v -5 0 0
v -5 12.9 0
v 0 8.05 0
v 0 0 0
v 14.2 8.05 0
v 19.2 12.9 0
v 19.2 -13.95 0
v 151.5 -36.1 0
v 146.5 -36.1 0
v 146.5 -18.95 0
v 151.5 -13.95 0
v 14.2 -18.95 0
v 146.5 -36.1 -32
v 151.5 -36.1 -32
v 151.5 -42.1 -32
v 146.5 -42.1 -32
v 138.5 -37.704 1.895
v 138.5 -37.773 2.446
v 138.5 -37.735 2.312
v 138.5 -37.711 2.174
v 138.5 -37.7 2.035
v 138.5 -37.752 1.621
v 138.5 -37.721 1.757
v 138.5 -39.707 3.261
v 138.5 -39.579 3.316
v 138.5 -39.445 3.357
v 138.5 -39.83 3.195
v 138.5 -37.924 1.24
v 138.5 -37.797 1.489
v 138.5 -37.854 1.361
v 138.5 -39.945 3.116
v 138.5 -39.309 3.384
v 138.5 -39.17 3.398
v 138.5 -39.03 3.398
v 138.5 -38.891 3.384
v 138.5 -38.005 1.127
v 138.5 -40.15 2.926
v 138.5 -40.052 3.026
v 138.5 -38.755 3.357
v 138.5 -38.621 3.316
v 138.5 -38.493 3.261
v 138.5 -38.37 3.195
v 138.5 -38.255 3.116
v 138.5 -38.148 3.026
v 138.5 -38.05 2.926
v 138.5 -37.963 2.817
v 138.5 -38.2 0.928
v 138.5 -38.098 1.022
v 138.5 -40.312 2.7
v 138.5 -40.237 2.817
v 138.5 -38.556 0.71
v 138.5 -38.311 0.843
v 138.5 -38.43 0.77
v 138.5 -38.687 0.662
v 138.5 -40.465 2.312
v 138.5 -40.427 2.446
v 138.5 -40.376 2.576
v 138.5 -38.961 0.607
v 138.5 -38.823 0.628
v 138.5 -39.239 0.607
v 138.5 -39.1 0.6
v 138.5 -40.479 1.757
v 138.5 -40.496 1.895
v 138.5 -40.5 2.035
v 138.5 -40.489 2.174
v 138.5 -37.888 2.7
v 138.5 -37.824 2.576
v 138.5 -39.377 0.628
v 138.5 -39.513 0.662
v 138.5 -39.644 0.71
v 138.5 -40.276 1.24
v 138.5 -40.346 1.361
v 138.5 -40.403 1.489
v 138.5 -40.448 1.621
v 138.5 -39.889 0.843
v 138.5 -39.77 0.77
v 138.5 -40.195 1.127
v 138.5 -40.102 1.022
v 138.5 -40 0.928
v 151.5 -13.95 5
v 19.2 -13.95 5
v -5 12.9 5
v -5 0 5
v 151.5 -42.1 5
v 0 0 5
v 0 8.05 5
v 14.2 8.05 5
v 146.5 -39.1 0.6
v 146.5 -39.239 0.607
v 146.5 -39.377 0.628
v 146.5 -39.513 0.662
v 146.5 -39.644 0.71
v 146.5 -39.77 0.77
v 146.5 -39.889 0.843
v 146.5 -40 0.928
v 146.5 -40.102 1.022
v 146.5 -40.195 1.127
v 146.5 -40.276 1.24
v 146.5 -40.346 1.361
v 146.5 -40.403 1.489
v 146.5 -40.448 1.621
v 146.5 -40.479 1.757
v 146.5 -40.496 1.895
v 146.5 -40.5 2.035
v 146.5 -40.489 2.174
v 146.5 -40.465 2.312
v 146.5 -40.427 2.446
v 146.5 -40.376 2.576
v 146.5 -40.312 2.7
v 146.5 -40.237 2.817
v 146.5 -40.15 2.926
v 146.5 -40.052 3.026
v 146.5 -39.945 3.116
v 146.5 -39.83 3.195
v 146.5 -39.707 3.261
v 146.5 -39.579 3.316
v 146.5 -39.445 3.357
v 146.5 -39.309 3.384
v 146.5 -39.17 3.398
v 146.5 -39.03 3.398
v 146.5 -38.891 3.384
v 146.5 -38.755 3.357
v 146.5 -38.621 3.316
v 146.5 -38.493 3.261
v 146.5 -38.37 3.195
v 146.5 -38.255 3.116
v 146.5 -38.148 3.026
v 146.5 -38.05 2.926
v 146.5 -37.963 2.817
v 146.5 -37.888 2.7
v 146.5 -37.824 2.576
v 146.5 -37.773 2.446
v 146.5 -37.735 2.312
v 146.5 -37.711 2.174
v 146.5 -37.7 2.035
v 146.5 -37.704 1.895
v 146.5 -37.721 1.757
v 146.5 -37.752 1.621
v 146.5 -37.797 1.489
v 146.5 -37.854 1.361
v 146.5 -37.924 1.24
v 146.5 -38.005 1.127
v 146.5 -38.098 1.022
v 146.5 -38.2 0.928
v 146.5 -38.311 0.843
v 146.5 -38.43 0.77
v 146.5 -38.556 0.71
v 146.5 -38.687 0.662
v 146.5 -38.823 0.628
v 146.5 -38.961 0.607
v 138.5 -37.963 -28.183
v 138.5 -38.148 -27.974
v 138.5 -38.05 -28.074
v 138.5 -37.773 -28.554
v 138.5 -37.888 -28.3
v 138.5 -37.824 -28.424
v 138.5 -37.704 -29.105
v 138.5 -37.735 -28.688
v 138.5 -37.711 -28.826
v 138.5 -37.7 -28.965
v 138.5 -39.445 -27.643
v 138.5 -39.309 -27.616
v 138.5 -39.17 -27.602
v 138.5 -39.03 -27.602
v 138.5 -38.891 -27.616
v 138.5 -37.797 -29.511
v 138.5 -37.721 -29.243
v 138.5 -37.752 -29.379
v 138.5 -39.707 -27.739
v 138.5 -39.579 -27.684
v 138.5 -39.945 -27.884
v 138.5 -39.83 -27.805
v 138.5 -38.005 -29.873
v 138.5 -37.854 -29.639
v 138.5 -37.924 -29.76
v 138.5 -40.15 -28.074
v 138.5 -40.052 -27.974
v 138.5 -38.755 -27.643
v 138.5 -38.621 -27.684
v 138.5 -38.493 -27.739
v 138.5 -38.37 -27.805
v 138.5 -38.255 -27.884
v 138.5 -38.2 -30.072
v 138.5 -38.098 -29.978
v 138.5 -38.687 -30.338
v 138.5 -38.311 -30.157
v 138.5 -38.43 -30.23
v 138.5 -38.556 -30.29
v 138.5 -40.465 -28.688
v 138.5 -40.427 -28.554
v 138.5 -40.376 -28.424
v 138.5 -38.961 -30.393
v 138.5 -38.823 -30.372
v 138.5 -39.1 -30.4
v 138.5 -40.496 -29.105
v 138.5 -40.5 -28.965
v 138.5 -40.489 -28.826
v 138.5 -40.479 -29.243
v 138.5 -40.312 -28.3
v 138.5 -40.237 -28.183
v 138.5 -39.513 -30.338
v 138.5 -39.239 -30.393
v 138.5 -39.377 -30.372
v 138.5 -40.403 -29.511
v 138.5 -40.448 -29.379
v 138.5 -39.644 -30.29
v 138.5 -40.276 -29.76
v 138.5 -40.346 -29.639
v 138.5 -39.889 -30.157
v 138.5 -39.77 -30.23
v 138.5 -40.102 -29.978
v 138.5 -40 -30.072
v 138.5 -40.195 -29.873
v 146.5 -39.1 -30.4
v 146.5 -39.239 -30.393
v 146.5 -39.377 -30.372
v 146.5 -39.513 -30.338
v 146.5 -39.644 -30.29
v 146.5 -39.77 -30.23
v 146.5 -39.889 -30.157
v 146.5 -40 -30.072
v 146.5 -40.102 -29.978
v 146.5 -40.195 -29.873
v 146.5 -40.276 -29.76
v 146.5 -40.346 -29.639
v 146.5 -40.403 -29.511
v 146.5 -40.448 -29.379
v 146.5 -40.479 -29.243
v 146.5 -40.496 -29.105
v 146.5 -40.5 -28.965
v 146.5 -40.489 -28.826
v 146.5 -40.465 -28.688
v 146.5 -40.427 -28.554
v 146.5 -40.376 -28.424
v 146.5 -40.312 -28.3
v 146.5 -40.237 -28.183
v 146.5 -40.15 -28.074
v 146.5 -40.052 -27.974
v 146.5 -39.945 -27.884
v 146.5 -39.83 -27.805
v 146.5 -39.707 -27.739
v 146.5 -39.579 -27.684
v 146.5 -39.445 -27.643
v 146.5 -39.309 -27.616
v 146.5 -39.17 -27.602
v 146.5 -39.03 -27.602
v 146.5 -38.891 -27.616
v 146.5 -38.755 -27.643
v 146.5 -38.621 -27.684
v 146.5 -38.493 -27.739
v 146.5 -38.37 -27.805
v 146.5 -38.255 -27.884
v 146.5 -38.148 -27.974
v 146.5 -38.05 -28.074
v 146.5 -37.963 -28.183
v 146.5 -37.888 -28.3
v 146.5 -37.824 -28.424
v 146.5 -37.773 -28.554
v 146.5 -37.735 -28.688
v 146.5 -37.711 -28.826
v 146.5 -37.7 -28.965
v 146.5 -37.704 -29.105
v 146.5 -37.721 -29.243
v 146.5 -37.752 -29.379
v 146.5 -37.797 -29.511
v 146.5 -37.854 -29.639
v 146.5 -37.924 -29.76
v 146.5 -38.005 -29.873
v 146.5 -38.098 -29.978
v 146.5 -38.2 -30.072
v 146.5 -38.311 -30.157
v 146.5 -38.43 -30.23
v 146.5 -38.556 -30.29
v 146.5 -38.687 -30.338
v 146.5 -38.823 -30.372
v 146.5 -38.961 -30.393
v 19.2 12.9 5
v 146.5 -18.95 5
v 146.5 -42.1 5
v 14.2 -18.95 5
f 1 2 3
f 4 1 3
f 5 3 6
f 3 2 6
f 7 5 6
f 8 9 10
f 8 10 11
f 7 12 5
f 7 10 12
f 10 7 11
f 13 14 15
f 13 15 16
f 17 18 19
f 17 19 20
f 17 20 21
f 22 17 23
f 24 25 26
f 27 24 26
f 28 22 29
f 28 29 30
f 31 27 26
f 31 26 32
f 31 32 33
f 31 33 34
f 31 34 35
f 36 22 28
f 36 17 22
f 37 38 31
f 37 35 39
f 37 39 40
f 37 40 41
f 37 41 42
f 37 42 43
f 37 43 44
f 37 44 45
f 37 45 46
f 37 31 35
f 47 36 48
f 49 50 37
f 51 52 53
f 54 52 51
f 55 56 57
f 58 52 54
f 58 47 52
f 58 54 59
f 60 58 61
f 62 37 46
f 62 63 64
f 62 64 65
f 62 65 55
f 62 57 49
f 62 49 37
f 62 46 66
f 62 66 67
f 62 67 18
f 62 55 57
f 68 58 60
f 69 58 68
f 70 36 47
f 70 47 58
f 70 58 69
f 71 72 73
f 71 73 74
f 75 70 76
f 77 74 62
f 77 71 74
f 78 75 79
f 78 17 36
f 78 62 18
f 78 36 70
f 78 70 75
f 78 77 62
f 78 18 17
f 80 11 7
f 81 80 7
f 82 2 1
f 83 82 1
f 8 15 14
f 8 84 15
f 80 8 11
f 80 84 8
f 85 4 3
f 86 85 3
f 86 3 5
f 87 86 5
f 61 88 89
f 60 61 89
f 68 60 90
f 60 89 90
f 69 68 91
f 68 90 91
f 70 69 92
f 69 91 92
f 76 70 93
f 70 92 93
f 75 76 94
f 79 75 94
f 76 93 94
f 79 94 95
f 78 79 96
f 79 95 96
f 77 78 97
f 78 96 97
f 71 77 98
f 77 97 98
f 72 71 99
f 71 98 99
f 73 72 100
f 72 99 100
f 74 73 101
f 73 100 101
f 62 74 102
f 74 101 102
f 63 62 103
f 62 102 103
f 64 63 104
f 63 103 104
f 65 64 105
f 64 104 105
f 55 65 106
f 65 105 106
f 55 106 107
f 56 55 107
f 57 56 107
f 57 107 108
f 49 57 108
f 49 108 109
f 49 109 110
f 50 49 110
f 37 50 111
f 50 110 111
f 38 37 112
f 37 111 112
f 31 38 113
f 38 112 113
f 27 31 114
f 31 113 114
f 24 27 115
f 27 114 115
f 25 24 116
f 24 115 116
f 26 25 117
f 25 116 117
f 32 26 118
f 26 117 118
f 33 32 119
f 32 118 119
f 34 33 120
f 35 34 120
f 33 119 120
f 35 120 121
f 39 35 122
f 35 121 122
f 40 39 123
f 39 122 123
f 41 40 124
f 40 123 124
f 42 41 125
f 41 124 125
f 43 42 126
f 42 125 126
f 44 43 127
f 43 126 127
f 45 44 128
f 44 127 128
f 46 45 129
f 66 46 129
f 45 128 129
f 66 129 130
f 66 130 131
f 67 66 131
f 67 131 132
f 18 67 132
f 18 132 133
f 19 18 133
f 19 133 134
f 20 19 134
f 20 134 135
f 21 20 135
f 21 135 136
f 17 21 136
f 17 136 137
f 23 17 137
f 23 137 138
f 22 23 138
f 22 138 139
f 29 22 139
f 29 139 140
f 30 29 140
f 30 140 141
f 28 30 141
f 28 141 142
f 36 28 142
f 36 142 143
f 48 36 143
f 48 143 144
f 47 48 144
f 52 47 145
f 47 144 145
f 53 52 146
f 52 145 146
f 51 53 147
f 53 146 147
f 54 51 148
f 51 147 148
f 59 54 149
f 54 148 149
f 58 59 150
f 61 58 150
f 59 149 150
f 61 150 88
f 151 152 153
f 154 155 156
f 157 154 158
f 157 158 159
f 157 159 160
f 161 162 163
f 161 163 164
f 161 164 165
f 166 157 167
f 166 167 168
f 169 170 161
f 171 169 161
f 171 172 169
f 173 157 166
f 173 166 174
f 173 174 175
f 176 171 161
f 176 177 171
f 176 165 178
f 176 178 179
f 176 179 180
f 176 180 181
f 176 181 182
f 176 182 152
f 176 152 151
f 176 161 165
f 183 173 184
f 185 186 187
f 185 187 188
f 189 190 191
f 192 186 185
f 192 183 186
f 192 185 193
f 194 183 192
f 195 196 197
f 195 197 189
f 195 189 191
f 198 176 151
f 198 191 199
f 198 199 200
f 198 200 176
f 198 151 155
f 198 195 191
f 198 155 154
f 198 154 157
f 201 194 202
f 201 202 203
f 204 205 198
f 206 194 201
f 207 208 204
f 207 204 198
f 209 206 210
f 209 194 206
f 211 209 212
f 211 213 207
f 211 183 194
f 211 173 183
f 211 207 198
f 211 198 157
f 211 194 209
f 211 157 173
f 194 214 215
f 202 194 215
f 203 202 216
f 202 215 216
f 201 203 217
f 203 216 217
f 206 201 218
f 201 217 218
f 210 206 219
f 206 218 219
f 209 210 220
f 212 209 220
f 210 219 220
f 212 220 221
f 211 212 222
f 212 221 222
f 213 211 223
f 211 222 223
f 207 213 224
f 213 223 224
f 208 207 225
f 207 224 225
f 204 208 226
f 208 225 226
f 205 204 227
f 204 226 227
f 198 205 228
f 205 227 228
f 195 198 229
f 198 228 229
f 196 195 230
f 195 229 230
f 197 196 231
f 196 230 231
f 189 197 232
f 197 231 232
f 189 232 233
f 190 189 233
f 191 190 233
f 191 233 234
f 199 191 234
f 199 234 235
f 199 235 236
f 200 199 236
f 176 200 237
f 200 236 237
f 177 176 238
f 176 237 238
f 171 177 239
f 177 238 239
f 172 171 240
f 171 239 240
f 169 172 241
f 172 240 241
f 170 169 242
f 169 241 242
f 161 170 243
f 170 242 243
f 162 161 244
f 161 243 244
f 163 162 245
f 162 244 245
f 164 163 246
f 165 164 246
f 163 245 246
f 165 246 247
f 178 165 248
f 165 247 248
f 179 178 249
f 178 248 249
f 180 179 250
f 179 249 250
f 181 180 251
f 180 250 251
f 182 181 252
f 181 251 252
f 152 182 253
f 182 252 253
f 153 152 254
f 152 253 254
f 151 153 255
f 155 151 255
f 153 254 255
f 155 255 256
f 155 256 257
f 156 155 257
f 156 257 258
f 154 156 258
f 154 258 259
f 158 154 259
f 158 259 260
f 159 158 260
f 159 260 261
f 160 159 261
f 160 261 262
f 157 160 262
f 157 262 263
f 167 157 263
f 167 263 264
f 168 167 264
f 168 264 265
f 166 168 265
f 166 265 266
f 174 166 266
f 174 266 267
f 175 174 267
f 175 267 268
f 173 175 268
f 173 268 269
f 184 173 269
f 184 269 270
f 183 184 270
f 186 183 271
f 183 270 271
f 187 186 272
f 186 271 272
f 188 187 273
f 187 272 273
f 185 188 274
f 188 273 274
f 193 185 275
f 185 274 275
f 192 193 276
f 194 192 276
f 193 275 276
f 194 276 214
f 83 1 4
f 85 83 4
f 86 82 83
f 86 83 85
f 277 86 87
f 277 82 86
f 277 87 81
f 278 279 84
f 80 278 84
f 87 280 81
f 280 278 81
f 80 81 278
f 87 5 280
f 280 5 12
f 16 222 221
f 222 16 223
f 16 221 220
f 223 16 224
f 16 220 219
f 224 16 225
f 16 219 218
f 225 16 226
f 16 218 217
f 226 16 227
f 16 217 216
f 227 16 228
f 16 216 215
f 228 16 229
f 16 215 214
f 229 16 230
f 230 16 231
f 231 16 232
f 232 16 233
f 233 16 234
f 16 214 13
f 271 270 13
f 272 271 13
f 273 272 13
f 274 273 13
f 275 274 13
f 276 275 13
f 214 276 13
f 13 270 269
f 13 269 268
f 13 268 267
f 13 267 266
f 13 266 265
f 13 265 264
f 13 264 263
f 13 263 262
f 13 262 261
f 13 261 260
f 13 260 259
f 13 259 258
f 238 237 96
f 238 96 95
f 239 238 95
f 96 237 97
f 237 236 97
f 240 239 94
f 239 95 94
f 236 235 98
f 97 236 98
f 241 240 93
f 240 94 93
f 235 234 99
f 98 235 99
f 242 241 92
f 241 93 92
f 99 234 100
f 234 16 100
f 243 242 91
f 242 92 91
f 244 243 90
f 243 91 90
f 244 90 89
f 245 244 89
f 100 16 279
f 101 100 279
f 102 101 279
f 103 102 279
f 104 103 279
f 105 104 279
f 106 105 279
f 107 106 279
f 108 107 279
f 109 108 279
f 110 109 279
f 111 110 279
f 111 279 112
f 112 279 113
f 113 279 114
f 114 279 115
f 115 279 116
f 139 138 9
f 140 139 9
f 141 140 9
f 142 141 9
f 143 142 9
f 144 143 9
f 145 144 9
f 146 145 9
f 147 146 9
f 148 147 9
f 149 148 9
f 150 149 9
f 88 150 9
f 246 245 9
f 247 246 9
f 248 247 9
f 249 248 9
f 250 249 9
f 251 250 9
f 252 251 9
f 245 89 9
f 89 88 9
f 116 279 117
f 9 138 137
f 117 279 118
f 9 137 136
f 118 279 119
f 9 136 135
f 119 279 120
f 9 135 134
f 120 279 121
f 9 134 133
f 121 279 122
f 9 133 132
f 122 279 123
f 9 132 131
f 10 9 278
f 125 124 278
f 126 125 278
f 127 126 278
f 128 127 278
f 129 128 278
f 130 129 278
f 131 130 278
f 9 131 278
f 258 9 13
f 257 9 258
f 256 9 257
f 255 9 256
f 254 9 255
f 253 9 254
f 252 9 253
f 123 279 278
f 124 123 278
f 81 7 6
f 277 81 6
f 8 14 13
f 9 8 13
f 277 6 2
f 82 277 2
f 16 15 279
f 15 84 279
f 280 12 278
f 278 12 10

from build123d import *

# Parameters (mm, degrees)
BOSS_EXTRUDE1_DEPTH = 5
SKETCH5_W           = 5
SKETCH5_H           = 6
BOSS_EXTRUDE7_DEPTH = 32
SKETCH4_R           = 1.4
BOSS_EXTRUDE4_DEPTH = 8


with BuildPart() as part:
    # Sketch1 → Boss-Extrude1 (new body)
    with BuildSketch(Plane.XY):
        Polygon((0, 6.7), (0, 8.05), (5.5, 8.05), (14.2, 8.05), (14.2, -18.95), (146.5, -18.95), (146.5, -42.1), (151.5, -42.1), (151.5, -13.95), (19.2, -13.95), (19.2, 12.9), (5.5, 12.9), (-5, 12.9), (-5, 0), (0, 0), align=None)
    extrude(amount=BOSS_EXTRUDE1_DEPTH)

    # Sketch5 → Boss-Extrude7 (add)
    with BuildSketch(Plane(origin=(0, 0, 0), x_dir=(-1, 0, 0), z_dir=(0, 0, -1))):
        with Locations((-149, -39.1)):
            Rectangle(SKETCH5_W, SKETCH5_H)
    extrude(amount=BOSS_EXTRUDE7_DEPTH)

    # Sketch4 → Boss-Extrude4 (add)
    with BuildSketch(Plane.ZY.offset(-146.5)):
        with Locations(Location((-29, -39.1, 0), (0, 0, 180))):
            Circle(SKETCH4_R)
        with Locations(Location((2, -39.1, 0), (0, 0, 180))):
            Circle(SKETCH4_R)
    extrude(amount=BOSS_EXTRUDE4_DEPTH)


solid = part.part
